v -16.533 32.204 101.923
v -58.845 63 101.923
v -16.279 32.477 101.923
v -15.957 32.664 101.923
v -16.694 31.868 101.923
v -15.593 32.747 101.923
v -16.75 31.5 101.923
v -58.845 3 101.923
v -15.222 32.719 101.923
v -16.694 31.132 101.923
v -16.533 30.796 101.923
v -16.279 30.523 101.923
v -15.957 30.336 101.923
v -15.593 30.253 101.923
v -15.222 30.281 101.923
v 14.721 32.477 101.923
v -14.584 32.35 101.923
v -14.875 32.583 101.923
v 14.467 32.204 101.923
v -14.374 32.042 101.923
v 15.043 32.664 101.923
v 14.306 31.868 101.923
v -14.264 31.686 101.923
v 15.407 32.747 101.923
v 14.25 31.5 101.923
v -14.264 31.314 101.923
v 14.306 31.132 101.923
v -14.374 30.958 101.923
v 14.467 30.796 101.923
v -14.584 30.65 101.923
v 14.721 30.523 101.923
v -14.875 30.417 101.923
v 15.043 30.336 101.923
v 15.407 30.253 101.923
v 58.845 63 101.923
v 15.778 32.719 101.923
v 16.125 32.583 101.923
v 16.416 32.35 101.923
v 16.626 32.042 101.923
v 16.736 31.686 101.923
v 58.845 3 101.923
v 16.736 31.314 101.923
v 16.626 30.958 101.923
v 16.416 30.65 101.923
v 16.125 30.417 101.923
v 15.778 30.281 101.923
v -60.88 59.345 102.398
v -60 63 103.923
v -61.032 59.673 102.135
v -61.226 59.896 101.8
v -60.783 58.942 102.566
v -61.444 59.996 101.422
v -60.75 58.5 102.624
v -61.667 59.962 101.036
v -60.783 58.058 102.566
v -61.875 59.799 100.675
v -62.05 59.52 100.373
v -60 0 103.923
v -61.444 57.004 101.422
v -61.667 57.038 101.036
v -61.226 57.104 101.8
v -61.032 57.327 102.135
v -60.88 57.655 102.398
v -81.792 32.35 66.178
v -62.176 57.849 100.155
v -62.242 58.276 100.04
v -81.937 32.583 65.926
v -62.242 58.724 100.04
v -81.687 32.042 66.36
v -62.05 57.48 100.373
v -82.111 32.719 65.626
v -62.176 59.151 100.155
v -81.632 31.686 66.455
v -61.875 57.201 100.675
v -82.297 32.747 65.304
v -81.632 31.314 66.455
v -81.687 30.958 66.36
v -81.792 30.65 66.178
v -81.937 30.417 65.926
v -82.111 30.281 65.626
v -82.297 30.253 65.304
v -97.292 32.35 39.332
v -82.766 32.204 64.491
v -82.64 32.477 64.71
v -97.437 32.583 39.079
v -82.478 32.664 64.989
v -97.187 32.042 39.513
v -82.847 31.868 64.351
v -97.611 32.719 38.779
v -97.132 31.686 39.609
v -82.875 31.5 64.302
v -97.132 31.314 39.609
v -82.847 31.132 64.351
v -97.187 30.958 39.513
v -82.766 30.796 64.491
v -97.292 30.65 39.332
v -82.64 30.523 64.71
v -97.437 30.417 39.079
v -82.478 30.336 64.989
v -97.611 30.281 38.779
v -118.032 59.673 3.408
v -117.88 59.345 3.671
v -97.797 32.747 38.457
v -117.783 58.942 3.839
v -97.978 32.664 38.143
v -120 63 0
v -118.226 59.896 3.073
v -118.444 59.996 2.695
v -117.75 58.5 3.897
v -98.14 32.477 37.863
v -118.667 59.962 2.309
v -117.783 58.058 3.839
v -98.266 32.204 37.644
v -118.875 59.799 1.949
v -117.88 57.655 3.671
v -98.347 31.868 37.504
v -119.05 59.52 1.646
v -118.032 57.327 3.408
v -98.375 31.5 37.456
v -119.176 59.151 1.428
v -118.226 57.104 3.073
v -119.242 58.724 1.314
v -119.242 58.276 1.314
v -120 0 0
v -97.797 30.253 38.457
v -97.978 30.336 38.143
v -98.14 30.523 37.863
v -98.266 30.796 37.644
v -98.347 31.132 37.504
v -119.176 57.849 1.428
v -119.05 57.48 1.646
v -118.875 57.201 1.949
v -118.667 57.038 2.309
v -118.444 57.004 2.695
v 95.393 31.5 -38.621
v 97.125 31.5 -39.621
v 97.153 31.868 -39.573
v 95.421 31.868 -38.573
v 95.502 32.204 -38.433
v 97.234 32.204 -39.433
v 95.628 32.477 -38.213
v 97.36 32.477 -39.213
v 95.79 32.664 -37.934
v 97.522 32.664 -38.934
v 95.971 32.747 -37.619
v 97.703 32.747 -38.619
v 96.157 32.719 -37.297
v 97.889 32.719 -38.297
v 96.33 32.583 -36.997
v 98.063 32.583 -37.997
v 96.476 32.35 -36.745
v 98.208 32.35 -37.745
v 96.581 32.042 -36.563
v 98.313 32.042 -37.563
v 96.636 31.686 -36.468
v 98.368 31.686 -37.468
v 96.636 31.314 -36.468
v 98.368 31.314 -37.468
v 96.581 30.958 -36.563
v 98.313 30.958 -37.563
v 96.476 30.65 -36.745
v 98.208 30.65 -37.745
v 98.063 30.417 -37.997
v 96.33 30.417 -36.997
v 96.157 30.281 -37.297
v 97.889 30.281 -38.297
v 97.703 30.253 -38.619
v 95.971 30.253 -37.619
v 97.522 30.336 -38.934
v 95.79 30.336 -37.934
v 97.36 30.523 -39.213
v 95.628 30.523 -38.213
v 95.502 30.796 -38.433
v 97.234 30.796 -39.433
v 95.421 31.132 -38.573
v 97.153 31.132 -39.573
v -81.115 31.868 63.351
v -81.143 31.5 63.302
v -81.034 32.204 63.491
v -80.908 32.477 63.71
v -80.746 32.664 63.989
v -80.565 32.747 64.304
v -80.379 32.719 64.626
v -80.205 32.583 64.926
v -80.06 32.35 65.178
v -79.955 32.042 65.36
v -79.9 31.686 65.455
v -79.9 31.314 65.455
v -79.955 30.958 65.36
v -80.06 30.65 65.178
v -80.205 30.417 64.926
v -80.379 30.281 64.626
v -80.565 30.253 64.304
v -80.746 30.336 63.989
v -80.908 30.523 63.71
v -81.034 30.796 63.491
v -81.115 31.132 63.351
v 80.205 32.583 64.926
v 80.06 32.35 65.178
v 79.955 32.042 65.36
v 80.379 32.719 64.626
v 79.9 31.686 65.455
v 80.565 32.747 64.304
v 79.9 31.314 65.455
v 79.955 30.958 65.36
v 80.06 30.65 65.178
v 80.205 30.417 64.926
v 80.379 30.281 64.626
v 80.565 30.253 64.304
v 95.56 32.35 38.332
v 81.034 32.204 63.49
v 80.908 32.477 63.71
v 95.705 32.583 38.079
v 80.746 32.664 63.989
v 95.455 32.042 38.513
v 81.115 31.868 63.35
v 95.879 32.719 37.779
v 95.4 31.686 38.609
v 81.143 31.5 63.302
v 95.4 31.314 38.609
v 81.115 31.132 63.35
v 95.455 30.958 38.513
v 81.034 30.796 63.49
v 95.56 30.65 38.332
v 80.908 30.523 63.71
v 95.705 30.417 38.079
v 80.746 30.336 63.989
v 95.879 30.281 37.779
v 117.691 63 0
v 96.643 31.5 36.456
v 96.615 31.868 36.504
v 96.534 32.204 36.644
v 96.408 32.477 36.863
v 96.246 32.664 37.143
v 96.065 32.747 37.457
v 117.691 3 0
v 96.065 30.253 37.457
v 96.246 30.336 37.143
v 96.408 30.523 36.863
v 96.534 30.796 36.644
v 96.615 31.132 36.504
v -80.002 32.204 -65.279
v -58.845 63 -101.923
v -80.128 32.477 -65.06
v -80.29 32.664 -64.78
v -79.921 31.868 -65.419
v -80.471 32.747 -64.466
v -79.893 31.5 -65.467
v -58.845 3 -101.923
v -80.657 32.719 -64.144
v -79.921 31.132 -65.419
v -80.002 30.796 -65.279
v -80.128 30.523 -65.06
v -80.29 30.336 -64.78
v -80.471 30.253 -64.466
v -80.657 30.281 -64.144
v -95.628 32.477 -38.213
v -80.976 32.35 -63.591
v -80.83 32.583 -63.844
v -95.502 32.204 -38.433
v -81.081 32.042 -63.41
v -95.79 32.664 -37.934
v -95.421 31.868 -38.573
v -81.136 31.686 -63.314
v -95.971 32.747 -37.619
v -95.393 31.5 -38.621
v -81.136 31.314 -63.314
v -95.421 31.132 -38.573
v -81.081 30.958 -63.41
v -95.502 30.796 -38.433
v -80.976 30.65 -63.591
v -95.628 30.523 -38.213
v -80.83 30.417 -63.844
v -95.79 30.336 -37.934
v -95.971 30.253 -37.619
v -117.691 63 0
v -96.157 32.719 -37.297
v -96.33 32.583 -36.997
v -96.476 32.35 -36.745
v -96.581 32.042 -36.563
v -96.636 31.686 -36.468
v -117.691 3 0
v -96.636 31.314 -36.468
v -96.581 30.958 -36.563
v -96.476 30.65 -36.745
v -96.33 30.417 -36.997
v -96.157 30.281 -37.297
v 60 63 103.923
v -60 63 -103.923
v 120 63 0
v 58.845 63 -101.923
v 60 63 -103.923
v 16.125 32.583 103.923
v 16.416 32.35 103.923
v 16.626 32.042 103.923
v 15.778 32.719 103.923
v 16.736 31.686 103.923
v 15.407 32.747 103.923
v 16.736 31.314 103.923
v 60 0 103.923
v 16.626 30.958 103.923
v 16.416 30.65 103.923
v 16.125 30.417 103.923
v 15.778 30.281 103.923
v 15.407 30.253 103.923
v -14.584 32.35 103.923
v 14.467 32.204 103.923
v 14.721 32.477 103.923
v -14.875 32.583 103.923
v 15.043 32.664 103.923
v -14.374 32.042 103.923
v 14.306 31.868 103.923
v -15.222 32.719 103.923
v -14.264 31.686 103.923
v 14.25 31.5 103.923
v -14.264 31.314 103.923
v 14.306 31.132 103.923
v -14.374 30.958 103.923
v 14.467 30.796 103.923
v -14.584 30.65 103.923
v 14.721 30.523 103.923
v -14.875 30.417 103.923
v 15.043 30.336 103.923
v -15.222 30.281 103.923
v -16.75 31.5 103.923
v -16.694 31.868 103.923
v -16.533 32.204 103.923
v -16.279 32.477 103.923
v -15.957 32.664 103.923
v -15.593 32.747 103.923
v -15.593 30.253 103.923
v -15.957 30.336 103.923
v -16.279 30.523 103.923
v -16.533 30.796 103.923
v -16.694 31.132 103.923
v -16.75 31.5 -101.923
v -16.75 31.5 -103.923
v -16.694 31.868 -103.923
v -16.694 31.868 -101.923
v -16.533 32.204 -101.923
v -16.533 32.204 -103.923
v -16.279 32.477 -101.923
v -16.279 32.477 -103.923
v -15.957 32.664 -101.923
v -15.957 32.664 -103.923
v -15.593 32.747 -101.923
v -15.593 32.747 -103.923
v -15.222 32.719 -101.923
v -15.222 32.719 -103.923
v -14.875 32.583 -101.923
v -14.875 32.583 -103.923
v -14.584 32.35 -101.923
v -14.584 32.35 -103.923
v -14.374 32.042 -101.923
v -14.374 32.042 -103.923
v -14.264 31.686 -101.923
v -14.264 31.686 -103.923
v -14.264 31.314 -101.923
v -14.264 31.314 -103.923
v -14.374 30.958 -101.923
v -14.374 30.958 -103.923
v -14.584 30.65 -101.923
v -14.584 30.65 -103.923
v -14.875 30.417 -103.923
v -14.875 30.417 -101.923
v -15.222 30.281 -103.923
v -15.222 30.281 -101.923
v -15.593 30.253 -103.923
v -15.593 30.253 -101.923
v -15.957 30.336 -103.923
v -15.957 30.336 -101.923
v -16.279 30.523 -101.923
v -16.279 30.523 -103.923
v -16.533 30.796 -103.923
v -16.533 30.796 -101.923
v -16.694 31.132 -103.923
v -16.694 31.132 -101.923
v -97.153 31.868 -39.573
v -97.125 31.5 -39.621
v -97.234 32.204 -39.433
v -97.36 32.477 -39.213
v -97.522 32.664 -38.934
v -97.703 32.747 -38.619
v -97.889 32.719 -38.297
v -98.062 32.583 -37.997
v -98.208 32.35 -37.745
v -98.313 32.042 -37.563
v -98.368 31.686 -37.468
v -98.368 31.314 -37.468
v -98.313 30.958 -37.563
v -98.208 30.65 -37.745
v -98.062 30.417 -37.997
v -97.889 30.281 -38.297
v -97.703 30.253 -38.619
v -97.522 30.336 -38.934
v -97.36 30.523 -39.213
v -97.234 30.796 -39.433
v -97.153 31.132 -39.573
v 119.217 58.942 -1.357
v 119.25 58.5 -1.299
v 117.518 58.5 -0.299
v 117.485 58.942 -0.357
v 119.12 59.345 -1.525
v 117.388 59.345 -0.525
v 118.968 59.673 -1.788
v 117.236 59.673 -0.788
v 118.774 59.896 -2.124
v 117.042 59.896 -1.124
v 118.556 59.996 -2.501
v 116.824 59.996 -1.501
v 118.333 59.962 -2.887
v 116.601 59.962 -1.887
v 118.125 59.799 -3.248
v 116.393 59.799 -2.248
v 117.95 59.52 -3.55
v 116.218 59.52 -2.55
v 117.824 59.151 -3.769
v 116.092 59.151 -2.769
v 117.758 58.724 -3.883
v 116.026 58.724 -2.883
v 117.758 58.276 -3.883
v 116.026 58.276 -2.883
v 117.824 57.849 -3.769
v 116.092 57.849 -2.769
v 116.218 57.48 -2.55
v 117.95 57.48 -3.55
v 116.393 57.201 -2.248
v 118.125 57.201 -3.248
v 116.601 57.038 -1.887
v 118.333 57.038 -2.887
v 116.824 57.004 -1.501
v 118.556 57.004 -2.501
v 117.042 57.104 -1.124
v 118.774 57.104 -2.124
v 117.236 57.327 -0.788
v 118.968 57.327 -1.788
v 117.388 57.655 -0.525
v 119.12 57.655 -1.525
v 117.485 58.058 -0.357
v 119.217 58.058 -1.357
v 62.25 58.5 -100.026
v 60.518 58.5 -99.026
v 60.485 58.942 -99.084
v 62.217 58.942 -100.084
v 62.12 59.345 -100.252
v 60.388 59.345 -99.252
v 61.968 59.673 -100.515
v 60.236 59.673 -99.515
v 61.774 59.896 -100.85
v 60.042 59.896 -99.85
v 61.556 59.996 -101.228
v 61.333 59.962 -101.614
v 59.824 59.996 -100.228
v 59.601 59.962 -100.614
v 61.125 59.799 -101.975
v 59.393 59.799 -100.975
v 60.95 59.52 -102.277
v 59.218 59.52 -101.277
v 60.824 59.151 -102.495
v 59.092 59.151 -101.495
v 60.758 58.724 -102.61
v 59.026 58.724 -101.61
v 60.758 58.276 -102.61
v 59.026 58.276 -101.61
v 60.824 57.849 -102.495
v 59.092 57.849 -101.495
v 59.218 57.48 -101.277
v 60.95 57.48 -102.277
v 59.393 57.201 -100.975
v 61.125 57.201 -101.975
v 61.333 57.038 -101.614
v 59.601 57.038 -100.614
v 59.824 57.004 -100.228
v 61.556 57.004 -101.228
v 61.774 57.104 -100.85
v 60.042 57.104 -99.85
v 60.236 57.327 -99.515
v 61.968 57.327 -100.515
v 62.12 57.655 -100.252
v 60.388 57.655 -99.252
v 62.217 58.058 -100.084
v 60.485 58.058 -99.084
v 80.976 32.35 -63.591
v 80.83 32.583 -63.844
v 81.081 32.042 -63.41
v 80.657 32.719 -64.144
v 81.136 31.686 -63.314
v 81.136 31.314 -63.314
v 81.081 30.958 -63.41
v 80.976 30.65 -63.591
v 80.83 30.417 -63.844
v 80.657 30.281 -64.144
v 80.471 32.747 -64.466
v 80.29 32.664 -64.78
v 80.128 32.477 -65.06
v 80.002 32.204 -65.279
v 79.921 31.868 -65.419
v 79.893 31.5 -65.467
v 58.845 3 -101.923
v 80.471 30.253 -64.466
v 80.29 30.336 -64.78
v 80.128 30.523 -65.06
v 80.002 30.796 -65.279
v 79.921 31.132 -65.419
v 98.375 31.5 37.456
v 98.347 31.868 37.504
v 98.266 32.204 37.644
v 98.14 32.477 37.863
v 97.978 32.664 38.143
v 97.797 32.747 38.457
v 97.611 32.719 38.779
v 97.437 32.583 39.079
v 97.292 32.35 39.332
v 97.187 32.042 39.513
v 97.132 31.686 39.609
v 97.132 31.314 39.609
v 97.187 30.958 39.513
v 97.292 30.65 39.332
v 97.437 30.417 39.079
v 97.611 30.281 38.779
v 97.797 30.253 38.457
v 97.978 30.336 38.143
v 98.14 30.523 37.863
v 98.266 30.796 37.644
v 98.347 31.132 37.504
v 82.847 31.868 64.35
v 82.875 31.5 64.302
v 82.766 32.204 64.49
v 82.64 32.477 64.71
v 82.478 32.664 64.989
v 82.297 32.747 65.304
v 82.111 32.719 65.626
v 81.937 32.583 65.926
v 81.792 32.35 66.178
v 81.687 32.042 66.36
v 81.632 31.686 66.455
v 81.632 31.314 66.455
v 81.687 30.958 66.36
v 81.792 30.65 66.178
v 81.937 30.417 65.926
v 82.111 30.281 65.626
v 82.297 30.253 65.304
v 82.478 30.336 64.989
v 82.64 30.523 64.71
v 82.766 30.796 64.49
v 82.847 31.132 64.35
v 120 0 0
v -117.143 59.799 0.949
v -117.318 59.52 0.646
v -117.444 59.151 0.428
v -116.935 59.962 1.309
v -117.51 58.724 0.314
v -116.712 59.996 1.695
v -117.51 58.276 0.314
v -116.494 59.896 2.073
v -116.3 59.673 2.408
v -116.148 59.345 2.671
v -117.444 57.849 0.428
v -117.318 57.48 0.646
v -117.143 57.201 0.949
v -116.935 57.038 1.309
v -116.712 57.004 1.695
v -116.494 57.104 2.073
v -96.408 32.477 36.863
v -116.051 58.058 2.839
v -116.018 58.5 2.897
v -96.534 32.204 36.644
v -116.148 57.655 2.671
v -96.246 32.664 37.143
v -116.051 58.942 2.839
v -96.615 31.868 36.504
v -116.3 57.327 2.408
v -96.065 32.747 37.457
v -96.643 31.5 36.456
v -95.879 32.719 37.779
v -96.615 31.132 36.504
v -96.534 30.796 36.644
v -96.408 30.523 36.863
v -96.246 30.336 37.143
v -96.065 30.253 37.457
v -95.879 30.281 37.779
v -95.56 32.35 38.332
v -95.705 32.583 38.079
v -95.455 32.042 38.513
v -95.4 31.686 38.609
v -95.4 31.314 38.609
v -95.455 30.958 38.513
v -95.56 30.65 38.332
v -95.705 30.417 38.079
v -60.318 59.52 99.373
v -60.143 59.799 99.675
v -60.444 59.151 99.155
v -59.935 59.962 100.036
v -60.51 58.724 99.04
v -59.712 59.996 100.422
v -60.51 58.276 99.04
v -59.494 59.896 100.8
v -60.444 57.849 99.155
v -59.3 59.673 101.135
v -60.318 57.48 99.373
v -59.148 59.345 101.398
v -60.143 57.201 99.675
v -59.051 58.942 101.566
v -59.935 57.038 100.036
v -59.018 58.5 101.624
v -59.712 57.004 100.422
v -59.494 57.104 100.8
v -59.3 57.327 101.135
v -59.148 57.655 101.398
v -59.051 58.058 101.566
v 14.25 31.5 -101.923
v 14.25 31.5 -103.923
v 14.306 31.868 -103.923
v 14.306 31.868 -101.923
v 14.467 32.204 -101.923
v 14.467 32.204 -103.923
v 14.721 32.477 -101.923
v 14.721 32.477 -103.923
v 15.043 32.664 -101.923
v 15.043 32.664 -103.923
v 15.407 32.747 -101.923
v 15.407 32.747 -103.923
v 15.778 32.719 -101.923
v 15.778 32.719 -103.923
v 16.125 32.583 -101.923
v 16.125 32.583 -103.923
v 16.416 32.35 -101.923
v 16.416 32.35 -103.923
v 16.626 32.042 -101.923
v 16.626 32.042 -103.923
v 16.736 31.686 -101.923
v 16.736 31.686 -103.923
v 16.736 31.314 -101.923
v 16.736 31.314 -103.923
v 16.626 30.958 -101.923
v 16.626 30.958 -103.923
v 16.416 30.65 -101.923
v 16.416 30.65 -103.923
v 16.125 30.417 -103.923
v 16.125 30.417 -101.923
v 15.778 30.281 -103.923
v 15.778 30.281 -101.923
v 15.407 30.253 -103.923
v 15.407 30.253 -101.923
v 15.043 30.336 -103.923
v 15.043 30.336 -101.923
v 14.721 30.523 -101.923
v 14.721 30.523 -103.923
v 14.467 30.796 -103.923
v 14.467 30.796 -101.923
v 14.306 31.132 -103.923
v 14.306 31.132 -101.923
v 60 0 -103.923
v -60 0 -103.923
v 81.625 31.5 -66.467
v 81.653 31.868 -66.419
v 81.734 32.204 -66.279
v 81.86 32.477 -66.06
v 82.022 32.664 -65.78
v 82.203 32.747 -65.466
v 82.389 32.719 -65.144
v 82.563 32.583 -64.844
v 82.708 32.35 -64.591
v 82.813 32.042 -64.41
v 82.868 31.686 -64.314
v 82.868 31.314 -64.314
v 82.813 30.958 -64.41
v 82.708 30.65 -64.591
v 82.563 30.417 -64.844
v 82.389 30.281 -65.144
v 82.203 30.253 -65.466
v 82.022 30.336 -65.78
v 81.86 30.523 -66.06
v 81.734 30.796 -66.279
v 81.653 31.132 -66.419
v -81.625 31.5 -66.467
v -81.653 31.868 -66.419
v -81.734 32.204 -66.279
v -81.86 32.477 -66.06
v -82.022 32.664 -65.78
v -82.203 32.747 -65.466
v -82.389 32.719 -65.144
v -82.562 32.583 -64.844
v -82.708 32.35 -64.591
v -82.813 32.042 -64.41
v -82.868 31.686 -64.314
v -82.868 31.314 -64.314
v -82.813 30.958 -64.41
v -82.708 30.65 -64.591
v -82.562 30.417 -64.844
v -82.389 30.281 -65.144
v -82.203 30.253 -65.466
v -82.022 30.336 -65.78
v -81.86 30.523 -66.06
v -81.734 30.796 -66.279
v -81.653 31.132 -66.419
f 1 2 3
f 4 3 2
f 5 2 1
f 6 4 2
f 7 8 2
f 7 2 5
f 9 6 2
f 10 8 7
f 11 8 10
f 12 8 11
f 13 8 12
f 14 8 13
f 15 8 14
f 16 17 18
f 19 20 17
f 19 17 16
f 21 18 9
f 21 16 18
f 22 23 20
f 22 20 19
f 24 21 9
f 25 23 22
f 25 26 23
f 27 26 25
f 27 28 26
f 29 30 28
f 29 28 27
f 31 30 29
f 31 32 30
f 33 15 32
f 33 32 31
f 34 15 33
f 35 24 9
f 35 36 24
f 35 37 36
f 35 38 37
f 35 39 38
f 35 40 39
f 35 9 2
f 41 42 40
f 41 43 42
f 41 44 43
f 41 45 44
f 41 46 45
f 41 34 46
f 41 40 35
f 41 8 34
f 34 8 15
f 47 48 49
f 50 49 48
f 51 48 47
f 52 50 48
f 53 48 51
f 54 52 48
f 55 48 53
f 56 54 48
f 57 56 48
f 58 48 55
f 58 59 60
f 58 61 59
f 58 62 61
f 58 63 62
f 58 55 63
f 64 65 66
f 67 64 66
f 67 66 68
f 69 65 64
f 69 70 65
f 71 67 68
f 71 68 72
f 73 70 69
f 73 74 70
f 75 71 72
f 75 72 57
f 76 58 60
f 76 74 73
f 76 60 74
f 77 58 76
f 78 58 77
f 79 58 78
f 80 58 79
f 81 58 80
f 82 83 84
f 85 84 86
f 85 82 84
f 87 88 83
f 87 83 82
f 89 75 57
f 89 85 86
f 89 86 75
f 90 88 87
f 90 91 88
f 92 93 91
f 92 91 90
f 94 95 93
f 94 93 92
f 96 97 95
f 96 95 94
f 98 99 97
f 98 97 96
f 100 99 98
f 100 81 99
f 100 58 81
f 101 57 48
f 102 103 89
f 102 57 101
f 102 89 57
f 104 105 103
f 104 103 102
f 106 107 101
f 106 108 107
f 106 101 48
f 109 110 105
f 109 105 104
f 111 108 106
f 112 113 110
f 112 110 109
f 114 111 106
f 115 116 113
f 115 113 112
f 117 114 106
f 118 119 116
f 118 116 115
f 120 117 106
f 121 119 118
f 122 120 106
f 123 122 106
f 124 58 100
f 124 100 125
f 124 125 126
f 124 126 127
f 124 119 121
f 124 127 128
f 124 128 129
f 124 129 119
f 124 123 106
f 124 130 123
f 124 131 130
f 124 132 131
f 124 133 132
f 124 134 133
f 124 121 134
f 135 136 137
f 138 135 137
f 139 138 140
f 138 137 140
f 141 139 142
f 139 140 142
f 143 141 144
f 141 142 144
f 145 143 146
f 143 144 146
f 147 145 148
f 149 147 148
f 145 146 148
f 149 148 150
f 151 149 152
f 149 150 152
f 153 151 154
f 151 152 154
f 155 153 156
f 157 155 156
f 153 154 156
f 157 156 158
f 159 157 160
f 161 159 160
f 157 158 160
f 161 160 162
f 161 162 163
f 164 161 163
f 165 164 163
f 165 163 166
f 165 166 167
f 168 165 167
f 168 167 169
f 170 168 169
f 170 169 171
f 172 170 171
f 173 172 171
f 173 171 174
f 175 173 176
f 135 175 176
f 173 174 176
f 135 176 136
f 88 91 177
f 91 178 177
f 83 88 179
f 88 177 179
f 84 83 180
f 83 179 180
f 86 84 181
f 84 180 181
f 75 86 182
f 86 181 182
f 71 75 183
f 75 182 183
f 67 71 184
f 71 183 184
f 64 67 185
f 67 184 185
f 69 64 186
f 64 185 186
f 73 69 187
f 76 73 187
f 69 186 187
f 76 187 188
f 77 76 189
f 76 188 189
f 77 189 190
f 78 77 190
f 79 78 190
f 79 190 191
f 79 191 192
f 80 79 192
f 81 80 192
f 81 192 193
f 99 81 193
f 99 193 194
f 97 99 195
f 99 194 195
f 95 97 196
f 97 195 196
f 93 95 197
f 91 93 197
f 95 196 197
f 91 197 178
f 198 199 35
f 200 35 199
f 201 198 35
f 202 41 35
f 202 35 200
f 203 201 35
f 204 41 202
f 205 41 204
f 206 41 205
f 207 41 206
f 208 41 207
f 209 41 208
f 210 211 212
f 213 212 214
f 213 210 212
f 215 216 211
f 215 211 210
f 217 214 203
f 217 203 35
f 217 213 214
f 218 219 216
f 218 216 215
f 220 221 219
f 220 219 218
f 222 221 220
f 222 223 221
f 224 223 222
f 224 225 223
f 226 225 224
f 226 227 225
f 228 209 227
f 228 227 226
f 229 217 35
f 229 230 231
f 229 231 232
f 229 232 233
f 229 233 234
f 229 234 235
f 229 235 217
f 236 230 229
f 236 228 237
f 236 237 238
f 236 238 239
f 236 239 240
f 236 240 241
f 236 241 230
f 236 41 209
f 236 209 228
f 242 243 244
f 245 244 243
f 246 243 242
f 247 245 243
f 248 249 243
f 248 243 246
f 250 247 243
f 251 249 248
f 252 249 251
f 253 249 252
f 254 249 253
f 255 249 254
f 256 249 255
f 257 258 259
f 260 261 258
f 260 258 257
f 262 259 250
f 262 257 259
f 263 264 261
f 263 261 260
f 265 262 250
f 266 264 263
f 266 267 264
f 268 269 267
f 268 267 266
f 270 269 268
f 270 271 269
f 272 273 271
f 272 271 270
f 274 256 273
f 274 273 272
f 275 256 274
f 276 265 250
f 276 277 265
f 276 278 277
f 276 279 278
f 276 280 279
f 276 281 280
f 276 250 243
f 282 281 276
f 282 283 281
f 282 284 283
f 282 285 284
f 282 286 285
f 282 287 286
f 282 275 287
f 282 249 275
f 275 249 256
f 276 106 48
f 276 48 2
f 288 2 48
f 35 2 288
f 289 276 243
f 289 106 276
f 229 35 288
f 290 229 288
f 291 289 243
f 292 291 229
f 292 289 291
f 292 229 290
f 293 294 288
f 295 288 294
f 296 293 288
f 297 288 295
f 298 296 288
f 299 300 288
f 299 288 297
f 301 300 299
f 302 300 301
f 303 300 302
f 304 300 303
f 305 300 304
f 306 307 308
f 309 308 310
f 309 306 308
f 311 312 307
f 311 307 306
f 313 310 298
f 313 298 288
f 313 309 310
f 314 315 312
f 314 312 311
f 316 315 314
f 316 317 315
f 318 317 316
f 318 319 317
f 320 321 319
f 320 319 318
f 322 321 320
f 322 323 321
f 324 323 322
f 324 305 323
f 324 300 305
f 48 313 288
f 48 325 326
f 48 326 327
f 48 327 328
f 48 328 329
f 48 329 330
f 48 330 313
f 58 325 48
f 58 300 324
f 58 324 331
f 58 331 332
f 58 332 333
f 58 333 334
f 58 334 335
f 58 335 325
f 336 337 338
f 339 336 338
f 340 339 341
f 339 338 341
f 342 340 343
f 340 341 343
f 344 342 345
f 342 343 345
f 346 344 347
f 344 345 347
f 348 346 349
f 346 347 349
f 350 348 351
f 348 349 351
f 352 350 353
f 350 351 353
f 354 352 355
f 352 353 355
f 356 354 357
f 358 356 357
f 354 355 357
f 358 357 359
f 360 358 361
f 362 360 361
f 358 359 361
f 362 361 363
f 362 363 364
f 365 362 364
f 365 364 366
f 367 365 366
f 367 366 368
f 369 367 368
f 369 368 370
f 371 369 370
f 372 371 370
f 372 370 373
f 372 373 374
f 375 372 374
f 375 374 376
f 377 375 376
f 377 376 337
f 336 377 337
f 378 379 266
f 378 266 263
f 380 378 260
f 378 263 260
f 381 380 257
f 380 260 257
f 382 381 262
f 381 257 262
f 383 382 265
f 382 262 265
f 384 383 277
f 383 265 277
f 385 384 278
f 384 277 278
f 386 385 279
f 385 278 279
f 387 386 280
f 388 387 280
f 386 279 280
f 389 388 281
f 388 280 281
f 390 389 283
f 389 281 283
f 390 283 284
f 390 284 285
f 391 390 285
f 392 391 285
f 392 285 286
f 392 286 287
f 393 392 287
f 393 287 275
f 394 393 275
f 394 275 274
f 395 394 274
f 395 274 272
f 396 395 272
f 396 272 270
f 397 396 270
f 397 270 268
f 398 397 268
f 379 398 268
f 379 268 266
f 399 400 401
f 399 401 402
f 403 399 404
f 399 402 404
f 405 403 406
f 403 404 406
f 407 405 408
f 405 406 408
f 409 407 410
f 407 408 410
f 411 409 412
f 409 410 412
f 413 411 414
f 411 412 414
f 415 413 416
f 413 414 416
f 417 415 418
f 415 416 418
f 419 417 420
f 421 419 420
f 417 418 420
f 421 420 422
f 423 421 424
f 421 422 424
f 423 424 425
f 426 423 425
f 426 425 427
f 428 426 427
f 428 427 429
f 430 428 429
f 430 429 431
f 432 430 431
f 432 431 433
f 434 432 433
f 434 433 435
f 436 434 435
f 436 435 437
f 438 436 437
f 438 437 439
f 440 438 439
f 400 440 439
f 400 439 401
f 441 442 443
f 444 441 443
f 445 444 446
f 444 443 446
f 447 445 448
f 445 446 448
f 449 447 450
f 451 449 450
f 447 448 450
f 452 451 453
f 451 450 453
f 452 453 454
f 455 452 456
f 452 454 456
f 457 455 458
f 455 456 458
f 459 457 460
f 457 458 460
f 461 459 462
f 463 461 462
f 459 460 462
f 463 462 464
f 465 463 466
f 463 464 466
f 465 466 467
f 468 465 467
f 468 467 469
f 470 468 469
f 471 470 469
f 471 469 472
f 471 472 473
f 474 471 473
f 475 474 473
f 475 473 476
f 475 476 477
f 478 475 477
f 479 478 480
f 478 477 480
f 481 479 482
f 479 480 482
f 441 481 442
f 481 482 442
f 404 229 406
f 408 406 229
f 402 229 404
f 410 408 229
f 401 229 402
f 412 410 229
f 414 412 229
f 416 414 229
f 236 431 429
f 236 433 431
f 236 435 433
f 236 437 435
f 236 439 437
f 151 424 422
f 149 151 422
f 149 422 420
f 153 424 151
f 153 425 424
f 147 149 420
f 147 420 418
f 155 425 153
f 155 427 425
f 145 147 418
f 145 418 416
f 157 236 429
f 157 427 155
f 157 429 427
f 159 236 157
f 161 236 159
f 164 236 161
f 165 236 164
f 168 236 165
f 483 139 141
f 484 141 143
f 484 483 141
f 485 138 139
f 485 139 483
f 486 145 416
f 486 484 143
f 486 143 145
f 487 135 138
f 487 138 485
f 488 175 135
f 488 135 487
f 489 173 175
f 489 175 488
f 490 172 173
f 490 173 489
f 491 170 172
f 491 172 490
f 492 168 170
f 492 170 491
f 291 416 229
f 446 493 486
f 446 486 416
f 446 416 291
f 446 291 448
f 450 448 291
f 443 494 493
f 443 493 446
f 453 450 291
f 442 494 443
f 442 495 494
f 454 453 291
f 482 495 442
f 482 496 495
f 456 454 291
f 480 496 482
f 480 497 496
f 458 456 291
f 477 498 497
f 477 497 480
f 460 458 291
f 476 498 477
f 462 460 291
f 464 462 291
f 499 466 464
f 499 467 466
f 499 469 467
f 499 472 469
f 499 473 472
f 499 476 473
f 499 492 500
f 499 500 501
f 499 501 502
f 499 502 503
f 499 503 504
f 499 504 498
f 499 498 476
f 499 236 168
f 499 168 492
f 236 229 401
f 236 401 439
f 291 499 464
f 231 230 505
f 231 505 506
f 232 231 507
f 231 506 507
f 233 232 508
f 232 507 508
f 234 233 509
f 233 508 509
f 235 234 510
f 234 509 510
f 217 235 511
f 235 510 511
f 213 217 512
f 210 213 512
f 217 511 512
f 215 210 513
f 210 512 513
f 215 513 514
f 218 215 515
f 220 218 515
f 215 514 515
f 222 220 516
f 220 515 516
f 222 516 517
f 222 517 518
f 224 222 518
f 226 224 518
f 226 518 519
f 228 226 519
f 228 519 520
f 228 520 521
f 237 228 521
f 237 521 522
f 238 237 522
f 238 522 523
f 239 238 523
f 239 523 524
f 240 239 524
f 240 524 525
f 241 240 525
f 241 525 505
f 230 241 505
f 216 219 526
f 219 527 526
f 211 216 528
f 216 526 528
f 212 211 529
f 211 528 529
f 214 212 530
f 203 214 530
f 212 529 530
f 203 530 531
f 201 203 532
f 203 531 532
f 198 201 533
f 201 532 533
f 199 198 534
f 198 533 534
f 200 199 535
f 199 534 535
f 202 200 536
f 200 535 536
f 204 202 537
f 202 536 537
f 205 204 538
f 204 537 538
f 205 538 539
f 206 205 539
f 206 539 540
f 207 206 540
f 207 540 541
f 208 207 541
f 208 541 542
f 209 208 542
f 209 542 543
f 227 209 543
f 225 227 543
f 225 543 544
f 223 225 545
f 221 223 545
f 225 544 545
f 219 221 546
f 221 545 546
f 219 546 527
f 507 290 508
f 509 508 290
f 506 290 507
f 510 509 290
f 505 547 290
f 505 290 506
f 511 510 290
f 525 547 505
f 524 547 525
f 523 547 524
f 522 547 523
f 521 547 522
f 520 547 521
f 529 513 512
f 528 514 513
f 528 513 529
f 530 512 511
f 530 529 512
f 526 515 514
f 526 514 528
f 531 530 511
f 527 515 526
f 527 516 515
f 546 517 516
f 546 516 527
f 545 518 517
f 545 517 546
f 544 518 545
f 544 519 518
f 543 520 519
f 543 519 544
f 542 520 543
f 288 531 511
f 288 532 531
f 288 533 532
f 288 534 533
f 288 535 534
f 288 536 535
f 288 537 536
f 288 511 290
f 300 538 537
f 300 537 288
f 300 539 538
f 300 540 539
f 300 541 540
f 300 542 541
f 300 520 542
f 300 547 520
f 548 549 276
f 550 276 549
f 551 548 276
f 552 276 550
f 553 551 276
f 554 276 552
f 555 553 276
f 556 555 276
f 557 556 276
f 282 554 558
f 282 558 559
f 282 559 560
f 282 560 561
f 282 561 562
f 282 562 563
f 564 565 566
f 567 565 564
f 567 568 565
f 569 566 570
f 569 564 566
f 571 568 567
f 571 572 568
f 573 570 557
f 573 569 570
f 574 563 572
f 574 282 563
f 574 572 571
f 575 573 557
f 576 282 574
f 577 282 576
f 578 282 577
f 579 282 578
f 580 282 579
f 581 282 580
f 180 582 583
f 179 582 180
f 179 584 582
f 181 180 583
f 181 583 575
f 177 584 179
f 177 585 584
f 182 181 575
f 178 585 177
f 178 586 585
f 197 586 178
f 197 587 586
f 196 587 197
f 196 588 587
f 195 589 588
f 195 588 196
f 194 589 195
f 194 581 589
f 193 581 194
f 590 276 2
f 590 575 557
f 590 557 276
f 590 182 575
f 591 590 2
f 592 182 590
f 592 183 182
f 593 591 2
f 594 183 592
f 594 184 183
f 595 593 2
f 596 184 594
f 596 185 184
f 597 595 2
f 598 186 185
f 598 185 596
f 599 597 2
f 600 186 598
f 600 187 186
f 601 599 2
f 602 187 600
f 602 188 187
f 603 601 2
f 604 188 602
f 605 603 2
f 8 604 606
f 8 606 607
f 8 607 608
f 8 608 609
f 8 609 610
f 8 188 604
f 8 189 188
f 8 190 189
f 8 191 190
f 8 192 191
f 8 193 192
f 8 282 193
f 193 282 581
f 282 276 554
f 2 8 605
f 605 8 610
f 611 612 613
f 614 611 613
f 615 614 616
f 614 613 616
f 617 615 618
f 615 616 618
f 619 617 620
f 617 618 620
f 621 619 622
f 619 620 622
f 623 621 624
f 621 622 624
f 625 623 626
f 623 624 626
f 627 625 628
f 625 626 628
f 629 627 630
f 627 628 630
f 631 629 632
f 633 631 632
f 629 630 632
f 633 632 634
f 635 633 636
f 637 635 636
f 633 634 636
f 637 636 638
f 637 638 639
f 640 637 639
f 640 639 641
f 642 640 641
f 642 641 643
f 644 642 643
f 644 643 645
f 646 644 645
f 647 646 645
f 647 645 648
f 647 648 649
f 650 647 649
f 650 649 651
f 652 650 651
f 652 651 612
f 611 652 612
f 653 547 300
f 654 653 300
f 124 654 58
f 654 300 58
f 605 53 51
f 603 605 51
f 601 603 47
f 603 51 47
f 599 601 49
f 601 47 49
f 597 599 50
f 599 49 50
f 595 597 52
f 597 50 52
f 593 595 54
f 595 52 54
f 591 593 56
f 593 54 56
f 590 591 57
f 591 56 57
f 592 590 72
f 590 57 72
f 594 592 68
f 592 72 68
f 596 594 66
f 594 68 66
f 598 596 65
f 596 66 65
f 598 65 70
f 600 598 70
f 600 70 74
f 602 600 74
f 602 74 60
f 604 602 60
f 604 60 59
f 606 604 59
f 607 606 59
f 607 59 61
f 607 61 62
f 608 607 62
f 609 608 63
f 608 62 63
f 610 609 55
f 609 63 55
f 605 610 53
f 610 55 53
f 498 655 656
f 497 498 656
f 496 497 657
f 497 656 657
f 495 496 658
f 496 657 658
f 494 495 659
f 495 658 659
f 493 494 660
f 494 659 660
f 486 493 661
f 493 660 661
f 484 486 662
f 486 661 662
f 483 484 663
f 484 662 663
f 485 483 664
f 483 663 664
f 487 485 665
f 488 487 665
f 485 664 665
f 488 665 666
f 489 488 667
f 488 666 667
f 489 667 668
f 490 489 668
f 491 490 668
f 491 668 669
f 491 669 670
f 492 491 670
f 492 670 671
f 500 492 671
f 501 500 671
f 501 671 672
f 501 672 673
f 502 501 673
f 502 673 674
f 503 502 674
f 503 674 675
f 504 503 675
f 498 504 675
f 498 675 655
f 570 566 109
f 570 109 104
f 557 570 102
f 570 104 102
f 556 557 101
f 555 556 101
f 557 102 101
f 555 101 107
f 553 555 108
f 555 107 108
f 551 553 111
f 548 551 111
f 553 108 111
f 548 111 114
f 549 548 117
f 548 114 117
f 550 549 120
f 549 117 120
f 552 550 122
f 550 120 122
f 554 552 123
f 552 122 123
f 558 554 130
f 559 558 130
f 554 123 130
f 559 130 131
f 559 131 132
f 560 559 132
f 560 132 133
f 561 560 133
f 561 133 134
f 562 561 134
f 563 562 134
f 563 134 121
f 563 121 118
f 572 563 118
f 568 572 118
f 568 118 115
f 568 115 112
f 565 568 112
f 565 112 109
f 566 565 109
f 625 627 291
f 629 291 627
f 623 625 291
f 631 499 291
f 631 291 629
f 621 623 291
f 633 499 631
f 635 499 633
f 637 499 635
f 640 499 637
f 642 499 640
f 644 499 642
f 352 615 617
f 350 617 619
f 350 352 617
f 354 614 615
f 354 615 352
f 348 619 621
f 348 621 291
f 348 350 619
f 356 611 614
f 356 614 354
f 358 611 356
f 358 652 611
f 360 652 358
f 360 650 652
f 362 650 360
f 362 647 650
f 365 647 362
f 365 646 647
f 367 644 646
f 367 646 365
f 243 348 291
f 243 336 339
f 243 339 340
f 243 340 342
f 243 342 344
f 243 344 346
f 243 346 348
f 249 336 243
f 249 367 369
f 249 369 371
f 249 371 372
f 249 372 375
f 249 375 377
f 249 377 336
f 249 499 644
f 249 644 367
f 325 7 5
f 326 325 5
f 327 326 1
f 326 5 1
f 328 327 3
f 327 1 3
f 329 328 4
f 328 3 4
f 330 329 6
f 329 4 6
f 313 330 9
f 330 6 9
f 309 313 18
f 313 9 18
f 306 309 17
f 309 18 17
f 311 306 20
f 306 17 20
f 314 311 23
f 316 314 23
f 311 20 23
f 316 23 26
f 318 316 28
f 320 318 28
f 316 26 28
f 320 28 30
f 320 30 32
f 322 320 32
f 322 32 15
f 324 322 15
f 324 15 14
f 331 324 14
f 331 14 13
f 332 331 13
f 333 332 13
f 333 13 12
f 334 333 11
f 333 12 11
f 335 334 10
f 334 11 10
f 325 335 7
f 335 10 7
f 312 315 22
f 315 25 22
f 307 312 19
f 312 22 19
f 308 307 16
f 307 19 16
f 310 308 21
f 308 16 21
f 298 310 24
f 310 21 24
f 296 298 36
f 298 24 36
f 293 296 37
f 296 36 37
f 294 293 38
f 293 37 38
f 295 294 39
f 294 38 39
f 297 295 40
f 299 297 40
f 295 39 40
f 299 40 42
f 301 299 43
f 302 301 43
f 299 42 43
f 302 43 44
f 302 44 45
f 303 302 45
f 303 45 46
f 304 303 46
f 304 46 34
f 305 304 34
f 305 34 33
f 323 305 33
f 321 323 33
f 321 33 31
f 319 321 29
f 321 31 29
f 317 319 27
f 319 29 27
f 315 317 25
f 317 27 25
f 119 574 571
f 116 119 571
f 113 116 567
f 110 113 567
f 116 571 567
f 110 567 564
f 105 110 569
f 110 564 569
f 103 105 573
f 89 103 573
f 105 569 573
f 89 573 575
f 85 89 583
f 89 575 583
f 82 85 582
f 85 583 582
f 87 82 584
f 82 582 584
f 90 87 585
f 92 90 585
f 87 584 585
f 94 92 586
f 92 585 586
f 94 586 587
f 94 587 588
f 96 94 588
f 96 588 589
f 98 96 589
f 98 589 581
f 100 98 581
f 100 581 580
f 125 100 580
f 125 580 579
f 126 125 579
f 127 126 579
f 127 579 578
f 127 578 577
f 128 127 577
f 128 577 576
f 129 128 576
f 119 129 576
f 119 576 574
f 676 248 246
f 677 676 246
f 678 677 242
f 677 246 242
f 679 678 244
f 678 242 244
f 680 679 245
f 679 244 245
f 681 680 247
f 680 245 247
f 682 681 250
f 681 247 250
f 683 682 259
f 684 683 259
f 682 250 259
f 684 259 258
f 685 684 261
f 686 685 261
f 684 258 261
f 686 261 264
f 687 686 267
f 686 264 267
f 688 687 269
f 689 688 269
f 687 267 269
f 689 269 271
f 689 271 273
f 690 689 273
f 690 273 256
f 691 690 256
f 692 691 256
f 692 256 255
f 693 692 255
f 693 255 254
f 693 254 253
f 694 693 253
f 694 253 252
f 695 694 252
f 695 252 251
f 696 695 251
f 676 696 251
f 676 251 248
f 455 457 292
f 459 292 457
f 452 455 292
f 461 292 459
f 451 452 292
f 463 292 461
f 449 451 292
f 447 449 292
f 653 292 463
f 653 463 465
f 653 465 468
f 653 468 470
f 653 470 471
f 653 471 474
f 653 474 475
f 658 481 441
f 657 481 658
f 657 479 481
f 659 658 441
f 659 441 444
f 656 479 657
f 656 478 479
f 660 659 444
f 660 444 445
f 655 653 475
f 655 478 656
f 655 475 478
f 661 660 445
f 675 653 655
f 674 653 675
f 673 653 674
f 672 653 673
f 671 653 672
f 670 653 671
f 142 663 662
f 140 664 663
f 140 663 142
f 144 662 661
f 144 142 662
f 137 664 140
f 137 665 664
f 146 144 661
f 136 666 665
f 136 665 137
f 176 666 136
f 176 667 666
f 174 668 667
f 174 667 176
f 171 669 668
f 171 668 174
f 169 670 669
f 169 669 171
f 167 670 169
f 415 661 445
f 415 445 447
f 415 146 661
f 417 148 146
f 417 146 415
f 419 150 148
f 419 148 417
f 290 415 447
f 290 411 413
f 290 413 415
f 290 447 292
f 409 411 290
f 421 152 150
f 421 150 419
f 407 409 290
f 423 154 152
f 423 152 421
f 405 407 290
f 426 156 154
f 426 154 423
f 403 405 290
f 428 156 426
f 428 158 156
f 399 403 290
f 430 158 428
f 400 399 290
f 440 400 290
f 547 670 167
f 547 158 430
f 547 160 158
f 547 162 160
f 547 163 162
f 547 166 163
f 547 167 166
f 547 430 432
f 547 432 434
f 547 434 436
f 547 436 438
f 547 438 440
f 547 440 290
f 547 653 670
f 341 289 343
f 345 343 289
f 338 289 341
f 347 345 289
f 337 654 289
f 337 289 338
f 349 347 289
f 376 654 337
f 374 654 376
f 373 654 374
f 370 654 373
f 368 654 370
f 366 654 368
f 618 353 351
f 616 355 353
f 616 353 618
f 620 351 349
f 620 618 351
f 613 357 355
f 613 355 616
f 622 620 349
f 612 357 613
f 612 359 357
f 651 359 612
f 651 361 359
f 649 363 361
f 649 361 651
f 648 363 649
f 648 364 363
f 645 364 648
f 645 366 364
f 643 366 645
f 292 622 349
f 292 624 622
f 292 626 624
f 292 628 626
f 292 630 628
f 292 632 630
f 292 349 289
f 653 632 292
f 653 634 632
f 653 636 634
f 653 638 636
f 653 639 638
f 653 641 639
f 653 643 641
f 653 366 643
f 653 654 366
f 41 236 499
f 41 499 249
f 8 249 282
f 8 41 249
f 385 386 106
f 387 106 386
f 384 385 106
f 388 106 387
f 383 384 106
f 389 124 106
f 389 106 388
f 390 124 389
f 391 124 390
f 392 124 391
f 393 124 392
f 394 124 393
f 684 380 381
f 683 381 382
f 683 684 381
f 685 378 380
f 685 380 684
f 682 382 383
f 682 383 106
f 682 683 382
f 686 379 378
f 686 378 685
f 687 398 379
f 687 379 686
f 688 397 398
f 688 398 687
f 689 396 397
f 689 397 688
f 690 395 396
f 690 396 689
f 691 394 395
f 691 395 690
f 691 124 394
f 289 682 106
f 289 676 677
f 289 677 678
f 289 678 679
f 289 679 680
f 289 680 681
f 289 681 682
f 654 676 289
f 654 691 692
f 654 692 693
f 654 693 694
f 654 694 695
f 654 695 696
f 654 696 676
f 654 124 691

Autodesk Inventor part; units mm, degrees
ref_plane "YZ Plane" through (0, 0, 0) normal (1, 0, 0) x (0, 1, 0)
ref_plane "XZ Plane" through (0, 0, 0) normal (0, 1, 0) x (-1, 0, 0)
ref_plane "XY Plane" through (0, 0, 0) normal (0, 0, 1) x (1, 0, 0)
sketch "Boceto1" plane through (0, 0, 0) normal (0, 1, 0) x (-1, 0, 0)
  line L0 (120, 0) -> (60, -103.923)
  line L1 (60, -103.923) -> (-60, -103.923)
  line L2 (-60, -103.923) -> (-120, 0)
  line L3 (-120, 0) -> (-60, 103.923)
  line L4 (-60, 103.923) -> (60, 103.923)
  line L5 (60, 103.923) -> (120, 0)
  point P0 (0, 0)
  point P1 (0, 0)
  dimension "d0" = 120
extrude "Extrusión1" add sketch "Boceto1" along normal blind 3
sketch "Boceto2" plane through (0, 3, 0) normal (0, 1, 0) x (1, 0, 0)
  line L0 (-60, -103.923) -> (60, -103.923) projected
  line L1 (60, -103.923) -> (120, 0) projected
  line L2 (120, 0) -> (60, 103.923) projected
  line L3 (60, 103.923) -> (-60, 103.923) projected
  line L4 (-60, 103.923) -> (-120, 0) projected
  line L5 (-120, 0) -> (-60, -103.923) projected
  line L6 (-58.8453, -101.923) -> (58.8453, -101.923)
  line L7 (58.8453, -101.923) -> (117.6906, 0)
  line L8 (117.6906, 0) -> (58.8453, 101.923)
  line L9 (58.8453, 101.923) -> (-58.8453, 101.923)
  line L10 (-58.8453, 101.923) -> (-117.6906, 0)
  line L11 (-117.6906, 0) -> (-58.8453, -101.923)
  point P0 (0, 0)
  dimension "d3" = 2
extrude "Extrusión2" add sketch "Boceto2" along normal blind 60
sketch "Boceto5" plane through (120, 0, 0) normal (0.866, 0, 0.5) x (0.5, 0, -0.866)
  line L0 (-120, 0) -> (0, 0) projected
  line L1 (0, 0) -> (0, 63) projected
  line L2 (-120, 63) -> (0, 63) projected
  line L3 (-120, 0) -> (-120, 63) projected
  point P0 (-60, 0)
sketch "Boceto9" plane through (-60, 0, 103.923) normal (-0.866, 0, 0.5) x (0.5, 0, 0.866)
  circle A0 centre (-117, 58.5) radius 1.5 projected
  circle A1 centre (-3, 58.5) radius 1.5 projected
  point P0 (-60, 0)
extrude "Extrusión7" cut sketch "Boceto9" against normal blind 220
sketch "Boceto10" plane through (-120, 0, 0) normal (-0.866, 0, -0.5) x (-0.5, 0, 0.866)
  line L0 (-120, 0) -> (0, 0) projected
  line L1 (0, 0) -> (0, 63) projected
  line L2 (-120, 63) -> (0, 63) projected
  line L3 (-120, 0) -> (-120, 63) projected
  line L4 (-120, 63) -> (-120, 31.5)
  line L5 (-120, 31.5) -> (-60, 31.5)
  line L6 (-60, 31.5) -> (-60, 0)
  dimension "d19" = 31.5
  dimension "d20" = 60
sketch "Boceto12" plane through (60, 0, -103.923) normal (0, 0, -1) x (-1, 0, 0)
  line L0 (120, 0) -> (120, 63) projected
  line L1 (120, 31.5) -> (60, 31.5)
  line L2 (60, 31.5) -> (60, 0)
  dimension "d23" = 60
sketch "Boceto13" plane through (60, 0, -103.923) normal (0, 0, -1) x (-1, 0, 0)
  circle A0 centre (44.5, 31.5) radius 1.25 projected
  circle A1 centre (75.5, 31.5) radius 1.25 projected
  point P0 (60, 0)
extrude "Extrusión9" cut sketch "Boceto13" against normal blind 220
sketch "Boceto14" plane through (60, 0, -103.923) normal (0.866, 0, -0.5) x (-0.5, 0, -0.866)
  line L0 (-60, 0) -> (-60, 31.5)
  line L1 (-60, 31.5) -> (0, 31.5)
  dimension "d26" = 31.5
sketch "Boceto15" plane through (60, 0, -103.923) normal (0.866, 0, -0.5) x (-0.5, 0, -0.866)
  circle A0 centre (-75.5, 31.5) radius 1.25 projected
  circle A1 centre (-44.5, 31.5) radius 1.25 projected
  point P0 (-60, 0)
extrude "Extrusión10" cut sketch "Boceto15" against normal blind 220
sketch "Boceto16" plane through (120, 0, 0) normal (0.866, 0, 0.5) x (0.5, 0, -0.866)
  line L0 (-60, 0) -> (-60, 31.5)
  line L1 (-60, 31.5) -> (0, 31.5)
  line L2 (0, 0) -> (0, 63) projected
  dimension "d29" = 31.5
sketch "Boceto17" plane through (120, 0, 0) normal (0.866, 0, 0.5) x (0.5, 0, -0.866)
  circle A0 centre (-75.5, 31.5) radius 1.25 projected
  circle A1 centre (-44.5, 31.5) radius 1.25 projected
  point P0 (-60, 0)
extrude "Extrusión11" cut sketch "Boceto17" against normal blind 220
properties part number "BaseHEX"
